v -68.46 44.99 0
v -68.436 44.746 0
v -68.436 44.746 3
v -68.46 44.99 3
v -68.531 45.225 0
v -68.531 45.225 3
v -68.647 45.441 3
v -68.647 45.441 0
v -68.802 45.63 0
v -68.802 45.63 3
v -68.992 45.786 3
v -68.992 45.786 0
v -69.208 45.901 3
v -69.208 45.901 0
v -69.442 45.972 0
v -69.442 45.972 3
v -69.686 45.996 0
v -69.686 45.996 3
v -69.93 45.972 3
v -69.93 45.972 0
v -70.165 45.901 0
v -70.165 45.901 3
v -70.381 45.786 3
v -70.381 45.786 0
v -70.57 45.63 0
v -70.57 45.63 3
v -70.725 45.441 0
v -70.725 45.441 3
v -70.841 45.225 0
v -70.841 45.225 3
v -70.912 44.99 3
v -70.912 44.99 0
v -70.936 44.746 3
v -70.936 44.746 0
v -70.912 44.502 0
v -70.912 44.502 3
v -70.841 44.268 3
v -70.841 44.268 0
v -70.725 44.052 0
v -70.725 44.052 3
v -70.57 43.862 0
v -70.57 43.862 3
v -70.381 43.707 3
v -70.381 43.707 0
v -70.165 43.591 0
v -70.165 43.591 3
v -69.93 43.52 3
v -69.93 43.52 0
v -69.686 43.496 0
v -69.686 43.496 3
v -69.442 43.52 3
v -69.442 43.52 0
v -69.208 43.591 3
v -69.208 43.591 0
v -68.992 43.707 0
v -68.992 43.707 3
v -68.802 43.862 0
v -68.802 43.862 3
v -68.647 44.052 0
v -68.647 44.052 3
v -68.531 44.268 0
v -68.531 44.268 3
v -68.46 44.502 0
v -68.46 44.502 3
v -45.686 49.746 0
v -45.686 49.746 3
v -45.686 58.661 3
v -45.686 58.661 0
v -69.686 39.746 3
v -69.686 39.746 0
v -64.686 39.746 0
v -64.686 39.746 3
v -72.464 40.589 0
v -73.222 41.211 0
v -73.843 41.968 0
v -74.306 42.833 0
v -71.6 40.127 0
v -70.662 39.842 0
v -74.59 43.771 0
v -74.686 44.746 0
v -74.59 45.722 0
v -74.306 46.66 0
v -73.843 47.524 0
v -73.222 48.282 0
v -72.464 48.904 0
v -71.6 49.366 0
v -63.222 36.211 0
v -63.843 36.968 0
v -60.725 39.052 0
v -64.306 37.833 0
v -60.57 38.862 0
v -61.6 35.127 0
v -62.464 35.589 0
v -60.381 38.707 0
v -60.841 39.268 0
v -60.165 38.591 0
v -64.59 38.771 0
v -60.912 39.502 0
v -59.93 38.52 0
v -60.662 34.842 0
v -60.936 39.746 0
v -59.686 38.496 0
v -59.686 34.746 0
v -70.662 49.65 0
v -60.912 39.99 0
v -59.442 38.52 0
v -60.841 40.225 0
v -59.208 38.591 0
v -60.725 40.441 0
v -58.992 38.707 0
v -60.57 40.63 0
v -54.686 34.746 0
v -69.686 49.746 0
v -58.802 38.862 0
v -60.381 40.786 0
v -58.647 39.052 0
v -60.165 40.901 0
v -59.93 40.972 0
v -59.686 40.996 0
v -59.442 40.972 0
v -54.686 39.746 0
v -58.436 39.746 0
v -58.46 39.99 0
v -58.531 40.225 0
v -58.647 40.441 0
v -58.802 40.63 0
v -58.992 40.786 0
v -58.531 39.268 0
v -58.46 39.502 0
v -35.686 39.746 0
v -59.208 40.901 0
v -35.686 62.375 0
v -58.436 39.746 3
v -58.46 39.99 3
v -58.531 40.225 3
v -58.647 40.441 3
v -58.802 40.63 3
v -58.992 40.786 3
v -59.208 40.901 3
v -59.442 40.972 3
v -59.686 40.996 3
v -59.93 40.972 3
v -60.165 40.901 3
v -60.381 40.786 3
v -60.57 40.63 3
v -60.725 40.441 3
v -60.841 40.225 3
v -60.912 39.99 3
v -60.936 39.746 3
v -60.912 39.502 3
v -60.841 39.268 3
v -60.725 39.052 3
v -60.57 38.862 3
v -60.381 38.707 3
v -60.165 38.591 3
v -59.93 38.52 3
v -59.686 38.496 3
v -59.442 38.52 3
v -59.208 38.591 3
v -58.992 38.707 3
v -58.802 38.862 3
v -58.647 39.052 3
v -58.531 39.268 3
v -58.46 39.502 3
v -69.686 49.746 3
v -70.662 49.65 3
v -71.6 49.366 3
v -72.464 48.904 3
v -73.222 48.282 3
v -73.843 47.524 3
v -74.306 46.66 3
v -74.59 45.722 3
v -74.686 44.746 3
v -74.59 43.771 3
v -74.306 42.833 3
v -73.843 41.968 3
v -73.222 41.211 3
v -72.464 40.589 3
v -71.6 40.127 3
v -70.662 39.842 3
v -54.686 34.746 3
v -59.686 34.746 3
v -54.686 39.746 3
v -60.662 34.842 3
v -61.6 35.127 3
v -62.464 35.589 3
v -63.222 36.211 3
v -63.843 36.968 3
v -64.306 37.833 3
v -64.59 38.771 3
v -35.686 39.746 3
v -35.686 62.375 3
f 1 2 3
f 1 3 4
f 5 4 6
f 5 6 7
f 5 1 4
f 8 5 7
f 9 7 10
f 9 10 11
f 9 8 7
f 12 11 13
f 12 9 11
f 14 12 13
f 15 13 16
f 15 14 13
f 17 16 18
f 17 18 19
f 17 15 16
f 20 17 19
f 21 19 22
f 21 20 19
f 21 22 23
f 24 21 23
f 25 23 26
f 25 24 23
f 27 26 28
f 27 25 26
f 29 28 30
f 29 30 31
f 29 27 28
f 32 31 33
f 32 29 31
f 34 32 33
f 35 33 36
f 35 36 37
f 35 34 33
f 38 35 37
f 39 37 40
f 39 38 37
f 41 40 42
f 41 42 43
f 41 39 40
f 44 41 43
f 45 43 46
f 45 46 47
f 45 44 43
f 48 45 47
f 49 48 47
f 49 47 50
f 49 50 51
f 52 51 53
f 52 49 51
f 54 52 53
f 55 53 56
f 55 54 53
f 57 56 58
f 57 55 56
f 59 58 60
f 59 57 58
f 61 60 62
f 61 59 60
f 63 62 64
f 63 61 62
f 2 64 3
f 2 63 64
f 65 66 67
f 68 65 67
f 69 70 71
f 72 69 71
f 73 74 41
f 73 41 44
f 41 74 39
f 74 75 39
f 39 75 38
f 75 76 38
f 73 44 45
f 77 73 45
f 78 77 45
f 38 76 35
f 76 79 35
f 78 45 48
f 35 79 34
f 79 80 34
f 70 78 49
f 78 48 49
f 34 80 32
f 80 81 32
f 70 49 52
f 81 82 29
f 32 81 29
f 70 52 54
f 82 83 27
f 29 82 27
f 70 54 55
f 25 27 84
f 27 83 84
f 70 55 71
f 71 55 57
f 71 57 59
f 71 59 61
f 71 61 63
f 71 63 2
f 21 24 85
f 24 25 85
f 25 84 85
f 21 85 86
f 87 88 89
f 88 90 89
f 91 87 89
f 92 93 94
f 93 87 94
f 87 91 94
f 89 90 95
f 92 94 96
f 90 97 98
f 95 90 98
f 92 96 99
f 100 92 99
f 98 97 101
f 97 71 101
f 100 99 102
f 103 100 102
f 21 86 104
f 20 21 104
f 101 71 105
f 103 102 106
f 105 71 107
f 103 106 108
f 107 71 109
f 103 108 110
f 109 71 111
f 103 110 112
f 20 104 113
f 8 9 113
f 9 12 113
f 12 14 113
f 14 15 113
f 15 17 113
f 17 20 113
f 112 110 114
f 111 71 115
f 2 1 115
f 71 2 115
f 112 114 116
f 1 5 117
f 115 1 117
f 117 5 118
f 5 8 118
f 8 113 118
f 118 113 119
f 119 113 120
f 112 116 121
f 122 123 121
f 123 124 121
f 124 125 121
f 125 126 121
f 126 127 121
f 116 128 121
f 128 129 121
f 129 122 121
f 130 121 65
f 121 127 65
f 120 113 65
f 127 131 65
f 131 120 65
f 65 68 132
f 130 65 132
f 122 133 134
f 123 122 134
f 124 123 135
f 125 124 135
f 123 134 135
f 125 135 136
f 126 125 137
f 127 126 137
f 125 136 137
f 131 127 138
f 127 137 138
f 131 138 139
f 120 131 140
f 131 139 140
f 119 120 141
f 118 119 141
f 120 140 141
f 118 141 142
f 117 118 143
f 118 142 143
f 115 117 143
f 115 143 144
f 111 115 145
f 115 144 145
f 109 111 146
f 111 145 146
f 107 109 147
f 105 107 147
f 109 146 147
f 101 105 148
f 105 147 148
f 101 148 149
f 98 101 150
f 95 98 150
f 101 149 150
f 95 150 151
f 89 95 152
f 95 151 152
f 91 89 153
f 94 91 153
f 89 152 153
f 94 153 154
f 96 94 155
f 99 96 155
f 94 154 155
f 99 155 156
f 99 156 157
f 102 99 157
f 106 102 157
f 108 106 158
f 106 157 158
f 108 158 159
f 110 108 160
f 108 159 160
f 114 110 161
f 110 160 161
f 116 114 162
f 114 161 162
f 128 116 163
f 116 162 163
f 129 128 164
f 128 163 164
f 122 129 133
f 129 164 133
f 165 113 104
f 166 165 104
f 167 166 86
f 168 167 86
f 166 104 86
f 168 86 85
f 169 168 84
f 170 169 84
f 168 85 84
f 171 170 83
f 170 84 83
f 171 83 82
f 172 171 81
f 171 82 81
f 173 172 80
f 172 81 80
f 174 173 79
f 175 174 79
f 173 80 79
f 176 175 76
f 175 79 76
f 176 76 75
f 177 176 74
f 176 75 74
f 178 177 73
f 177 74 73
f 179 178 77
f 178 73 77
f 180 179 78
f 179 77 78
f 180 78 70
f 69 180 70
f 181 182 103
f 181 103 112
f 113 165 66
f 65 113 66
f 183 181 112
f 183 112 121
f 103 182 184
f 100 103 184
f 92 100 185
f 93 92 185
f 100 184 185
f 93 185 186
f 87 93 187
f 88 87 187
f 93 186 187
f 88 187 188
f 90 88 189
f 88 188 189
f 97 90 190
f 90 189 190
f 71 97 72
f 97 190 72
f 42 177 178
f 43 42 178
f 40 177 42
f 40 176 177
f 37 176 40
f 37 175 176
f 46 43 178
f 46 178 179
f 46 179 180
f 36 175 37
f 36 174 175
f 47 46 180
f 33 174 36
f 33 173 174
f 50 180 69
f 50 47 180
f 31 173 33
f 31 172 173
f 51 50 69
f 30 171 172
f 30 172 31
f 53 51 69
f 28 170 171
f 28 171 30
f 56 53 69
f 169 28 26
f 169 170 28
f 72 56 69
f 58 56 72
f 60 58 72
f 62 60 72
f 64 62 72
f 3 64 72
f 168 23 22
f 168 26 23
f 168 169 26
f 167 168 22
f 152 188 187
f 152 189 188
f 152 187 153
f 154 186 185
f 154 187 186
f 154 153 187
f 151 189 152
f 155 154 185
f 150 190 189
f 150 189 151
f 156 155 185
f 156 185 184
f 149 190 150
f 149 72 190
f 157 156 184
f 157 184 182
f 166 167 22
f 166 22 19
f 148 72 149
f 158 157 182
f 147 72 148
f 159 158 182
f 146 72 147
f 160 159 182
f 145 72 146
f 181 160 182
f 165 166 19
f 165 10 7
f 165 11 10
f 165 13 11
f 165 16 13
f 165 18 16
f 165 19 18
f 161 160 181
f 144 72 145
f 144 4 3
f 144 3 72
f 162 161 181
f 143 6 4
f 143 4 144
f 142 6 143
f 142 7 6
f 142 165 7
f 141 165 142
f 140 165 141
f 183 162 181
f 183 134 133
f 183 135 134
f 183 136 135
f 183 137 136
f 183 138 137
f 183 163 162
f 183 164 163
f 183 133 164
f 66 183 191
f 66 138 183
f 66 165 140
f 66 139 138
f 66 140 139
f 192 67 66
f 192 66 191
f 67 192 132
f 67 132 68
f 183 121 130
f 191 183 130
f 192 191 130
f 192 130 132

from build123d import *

# Parameters (mm, degrees)
SKETCH2_R           = 1.5
BOSS_EXTRUDE3_DEPTH = 3
BOSS_EXTRUDE4_DEPTH = 3
SKETCH4_R           = 1.25
CUT_EXTRUDE1_DEPTH  = 3
BOSS_EXTRUDE5_DEPTH = 3
CUT_EXTRUDE2_DEPTH  = 3
BOSS_EXTRUDE6_START = -3
SKETCH7_R           = 1.5
SKETCH7_R_2         = 1.25
BOSS_EXTRUDE6_DEPTH = 3
CUT_EXTRUDE3_DEPTH  = 10
BOSS_EXTRUDE7_DEPTH = 3


with BuildPart() as part:
    # Sketch2 → Boss-Extrude3 (new body)
    with BuildSketch(Plane.XY):
        with BuildLine():
            Line((-69.686145903, 39.746340023), (-34.686145903, 39.746340023))
            Line((-34.686145903, 39.746340023), (-34.686145903, 59.746340023))
            Line((-34.686145903, 59.746340023), (-69.686145903, 49.746340023))
            ThreePointArc((-69.686145903, 49.746340023), (-74.686145903, 44.746340023), (-69.686145903, 39.746340023))
        make_face()
        with Locations((-69.686145903, 44.746340023)):
            Circle(SKETCH2_R, mode=Mode.SUBTRACT)
    extrude(amount=BOSS_EXTRUDE3_DEPTH)

    # Sketch3 → Boss-Extrude4 (add)
    with BuildSketch(Plane.XY.offset(3)):
        with BuildLine():
            Line((-64.686145903, 39.746340023), (-59.686145903, 39.746340023))
            Line((-59.686145903, 39.746340023), (-54.686145903, 39.746340023))
            ThreePointArc((-54.686145903, 39.746340023), (-59.686145903, 34.746340023), (-64.686145903, 39.746340023))
        make_face()
    extrude(amount=-BOSS_EXTRUDE4_DEPTH)

    # Sketch4 → Cut-Extrude1 (cut)
    with BuildSketch(Plane.XY.offset(3)):
        with Locations((-59.686145903, 39.746340023)):
            Circle(SKETCH4_R)
    extrude(amount=-CUT_EXTRUDE1_DEPTH, mode=Mode.SUBTRACT)

    # Sketch5 → Boss-Extrude5 (add)
    with BuildSketch(Plane.XY.offset(3)):
        Polygon((-34.686145903, 59.746340023), (-34.686145903, 62.746340023), (-69.686145903, 49.746340023), align=None)
    extrude(amount=-BOSS_EXTRUDE5_DEPTH)

    # Sketch6 → Cut-Extrude2 (cut)
    with BuildSketch(Plane.XY.offset(3)):
        Polygon((-34.686145903, 39.746340023), (-35.686145903, 39.746340023), (-35.686145903, 63.560014977), (-33.928047703, 63.560014977), (-33.928047703, 39.746340023), align=None)
    extrude(amount=-CUT_EXTRUDE2_DEPTH, mode=Mode.SUBTRACT)

    # Sketch7 → Boss-Extrude6 (add)
    with BuildSketch(Plane.XY.offset(3).offset(BOSS_EXTRUDE6_START)):
        with Locations((-69.686145903, 44.746340023)):
            Circle(SKETCH7_R)
        with Locations((-69.686145903, 44.746340023)):
            Circle(SKETCH7_R_2, mode=Mode.SUBTRACT)
    extrude(amount=BOSS_EXTRUDE6_DEPTH)

    # Sketch8 → Cut-Extrude3 (cut)
    with BuildSketch(Plane.XY.offset(3)):
        Polygon((-69.686145903, 49.746340023), (-45.686145903, 49.746340023), (-45.686145903, 58.660625737), align=None)
    extrude(amount=-CUT_EXTRUDE3_DEPTH, mode=Mode.SUBTRACT)

    # Sketch9 → Boss-Extrude7 (add)
    with BuildSketch(Plane.XY.offset(3)):
        with BuildLine():
            Line((-59.686145903, 34.746340023), (-54.686145903, 34.746340023))
            Line((-54.686145903, 34.746340023), (-54.686145903, 39.746340023))
            ThreePointArc((-54.686145903, 39.746340023), (-56.150611997, 36.210806117), (-59.686145903, 34.746340023))
        make_face()
    extrude(amount=-BOSS_EXTRUDE7_DEPTH)


solid = part.part
